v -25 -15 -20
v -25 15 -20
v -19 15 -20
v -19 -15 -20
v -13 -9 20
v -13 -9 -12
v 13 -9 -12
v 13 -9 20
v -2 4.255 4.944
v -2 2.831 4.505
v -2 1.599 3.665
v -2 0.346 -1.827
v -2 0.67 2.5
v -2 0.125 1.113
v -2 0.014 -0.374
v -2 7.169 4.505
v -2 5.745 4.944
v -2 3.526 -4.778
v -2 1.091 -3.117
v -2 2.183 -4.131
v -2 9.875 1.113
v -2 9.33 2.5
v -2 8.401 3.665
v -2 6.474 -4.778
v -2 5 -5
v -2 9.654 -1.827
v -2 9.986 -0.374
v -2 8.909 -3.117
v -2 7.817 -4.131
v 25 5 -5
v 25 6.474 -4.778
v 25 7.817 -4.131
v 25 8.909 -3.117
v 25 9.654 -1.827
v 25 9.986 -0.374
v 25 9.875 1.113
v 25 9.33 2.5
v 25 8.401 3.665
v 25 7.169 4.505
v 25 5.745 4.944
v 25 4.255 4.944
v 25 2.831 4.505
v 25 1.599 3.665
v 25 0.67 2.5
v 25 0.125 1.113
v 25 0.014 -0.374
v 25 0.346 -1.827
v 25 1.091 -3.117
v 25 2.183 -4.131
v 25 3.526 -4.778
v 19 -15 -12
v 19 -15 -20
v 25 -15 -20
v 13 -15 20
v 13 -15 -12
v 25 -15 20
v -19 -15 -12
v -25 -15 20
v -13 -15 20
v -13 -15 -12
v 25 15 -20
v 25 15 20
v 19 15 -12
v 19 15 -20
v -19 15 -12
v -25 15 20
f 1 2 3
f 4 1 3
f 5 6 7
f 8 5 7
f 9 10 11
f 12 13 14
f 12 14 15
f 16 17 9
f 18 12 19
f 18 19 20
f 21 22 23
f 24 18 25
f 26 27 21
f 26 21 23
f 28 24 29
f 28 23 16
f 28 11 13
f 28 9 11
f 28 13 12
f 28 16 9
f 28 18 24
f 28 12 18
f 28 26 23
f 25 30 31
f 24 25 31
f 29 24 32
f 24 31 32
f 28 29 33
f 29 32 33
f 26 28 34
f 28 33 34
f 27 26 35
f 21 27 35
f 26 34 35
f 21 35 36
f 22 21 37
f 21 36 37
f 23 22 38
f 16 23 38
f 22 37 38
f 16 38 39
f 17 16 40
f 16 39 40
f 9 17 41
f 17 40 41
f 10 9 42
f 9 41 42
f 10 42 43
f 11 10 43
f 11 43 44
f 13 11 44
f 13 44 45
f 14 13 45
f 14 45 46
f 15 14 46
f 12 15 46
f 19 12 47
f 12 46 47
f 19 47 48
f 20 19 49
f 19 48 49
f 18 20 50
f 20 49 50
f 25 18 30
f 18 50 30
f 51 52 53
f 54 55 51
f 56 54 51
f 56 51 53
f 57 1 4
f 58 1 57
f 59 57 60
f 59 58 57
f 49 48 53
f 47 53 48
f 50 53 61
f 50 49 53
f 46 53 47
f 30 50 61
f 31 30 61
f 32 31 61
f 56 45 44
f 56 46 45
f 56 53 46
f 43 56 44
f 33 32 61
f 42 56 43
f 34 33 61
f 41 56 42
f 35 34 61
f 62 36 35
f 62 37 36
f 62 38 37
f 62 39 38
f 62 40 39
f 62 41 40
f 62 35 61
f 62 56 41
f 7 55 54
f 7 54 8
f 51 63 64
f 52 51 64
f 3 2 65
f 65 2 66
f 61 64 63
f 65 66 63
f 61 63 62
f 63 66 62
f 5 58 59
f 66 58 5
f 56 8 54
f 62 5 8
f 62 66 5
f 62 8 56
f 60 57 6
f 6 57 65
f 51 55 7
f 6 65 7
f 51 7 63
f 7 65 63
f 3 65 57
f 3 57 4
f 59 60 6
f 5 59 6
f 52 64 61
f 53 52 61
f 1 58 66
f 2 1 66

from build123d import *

# Parameters (mm, degrees)
SKETCH_1_W               = 50
SKETCH_1_H               = 30
EXTRUDE_1_DEPTH          = 20
CUT_EXTRUDE_2_DEPTH      = 36.355339059
CUT_EXTRUDE_2_DEPTH_BACK = 36.355339059
SKETCH_2_W               = 26
SKETCH_2_H               = 6
SKETCH_4_W               = 38
SKETCH_4_H               = 8
CUT_EXTRUDE_3_DEPTH      = 44.874821937
SKETCH_5_R               = 5
CUT_EXTRUDE_5_DEPTH      = 27


with BuildPart() as part:
    # 草圖1 → 填料-伸長1 (new, symmetric)
    with BuildSketch(Plane.XY):
        Rectangle(SKETCH_1_W, SKETCH_1_H)
    extrude(amount=EXTRUDE_1_DEPTH, both=True)

    # 草圖2 → 除料-伸長2 (cut, two sides: drawn at the far end of the back side and taken through both)
    with BuildSketch(Plane.XY.offset(-CUT_EXTRUDE_2_DEPTH_BACK)):
        with Locations((0, -12)):
            Rectangle(SKETCH_2_W, SKETCH_2_H)
    extrude(amount=CUT_EXTRUDE_2_DEPTH + CUT_EXTRUDE_2_DEPTH_BACK, mode=Mode.SUBTRACT)

    # 草圖4 → 除料-伸長3 (cut, through all)
    with BuildSketch(Plane(origin=(0, 15, 0), x_dir=(1, 0, 0), z_dir=(0, 1, 0))):
        with Locations((0, 16)):
            Rectangle(SKETCH_4_W, SKETCH_4_H)
    extrude(amount=-CUT_EXTRUDE_3_DEPTH, mode=Mode.SUBTRACT)

    # 草圖5 → 除料-伸長5 (cut)
    with BuildSketch(Plane(origin=(25, 0, 0), x_dir=(0, 0, -1), z_dir=(1, 0, 0))):
        with Locations((0, 5)):
            Circle(SKETCH_5_R)
    extrude(amount=-CUT_EXTRUDE_5_DEPTH, mode=Mode.SUBTRACT)


solid = part.part
